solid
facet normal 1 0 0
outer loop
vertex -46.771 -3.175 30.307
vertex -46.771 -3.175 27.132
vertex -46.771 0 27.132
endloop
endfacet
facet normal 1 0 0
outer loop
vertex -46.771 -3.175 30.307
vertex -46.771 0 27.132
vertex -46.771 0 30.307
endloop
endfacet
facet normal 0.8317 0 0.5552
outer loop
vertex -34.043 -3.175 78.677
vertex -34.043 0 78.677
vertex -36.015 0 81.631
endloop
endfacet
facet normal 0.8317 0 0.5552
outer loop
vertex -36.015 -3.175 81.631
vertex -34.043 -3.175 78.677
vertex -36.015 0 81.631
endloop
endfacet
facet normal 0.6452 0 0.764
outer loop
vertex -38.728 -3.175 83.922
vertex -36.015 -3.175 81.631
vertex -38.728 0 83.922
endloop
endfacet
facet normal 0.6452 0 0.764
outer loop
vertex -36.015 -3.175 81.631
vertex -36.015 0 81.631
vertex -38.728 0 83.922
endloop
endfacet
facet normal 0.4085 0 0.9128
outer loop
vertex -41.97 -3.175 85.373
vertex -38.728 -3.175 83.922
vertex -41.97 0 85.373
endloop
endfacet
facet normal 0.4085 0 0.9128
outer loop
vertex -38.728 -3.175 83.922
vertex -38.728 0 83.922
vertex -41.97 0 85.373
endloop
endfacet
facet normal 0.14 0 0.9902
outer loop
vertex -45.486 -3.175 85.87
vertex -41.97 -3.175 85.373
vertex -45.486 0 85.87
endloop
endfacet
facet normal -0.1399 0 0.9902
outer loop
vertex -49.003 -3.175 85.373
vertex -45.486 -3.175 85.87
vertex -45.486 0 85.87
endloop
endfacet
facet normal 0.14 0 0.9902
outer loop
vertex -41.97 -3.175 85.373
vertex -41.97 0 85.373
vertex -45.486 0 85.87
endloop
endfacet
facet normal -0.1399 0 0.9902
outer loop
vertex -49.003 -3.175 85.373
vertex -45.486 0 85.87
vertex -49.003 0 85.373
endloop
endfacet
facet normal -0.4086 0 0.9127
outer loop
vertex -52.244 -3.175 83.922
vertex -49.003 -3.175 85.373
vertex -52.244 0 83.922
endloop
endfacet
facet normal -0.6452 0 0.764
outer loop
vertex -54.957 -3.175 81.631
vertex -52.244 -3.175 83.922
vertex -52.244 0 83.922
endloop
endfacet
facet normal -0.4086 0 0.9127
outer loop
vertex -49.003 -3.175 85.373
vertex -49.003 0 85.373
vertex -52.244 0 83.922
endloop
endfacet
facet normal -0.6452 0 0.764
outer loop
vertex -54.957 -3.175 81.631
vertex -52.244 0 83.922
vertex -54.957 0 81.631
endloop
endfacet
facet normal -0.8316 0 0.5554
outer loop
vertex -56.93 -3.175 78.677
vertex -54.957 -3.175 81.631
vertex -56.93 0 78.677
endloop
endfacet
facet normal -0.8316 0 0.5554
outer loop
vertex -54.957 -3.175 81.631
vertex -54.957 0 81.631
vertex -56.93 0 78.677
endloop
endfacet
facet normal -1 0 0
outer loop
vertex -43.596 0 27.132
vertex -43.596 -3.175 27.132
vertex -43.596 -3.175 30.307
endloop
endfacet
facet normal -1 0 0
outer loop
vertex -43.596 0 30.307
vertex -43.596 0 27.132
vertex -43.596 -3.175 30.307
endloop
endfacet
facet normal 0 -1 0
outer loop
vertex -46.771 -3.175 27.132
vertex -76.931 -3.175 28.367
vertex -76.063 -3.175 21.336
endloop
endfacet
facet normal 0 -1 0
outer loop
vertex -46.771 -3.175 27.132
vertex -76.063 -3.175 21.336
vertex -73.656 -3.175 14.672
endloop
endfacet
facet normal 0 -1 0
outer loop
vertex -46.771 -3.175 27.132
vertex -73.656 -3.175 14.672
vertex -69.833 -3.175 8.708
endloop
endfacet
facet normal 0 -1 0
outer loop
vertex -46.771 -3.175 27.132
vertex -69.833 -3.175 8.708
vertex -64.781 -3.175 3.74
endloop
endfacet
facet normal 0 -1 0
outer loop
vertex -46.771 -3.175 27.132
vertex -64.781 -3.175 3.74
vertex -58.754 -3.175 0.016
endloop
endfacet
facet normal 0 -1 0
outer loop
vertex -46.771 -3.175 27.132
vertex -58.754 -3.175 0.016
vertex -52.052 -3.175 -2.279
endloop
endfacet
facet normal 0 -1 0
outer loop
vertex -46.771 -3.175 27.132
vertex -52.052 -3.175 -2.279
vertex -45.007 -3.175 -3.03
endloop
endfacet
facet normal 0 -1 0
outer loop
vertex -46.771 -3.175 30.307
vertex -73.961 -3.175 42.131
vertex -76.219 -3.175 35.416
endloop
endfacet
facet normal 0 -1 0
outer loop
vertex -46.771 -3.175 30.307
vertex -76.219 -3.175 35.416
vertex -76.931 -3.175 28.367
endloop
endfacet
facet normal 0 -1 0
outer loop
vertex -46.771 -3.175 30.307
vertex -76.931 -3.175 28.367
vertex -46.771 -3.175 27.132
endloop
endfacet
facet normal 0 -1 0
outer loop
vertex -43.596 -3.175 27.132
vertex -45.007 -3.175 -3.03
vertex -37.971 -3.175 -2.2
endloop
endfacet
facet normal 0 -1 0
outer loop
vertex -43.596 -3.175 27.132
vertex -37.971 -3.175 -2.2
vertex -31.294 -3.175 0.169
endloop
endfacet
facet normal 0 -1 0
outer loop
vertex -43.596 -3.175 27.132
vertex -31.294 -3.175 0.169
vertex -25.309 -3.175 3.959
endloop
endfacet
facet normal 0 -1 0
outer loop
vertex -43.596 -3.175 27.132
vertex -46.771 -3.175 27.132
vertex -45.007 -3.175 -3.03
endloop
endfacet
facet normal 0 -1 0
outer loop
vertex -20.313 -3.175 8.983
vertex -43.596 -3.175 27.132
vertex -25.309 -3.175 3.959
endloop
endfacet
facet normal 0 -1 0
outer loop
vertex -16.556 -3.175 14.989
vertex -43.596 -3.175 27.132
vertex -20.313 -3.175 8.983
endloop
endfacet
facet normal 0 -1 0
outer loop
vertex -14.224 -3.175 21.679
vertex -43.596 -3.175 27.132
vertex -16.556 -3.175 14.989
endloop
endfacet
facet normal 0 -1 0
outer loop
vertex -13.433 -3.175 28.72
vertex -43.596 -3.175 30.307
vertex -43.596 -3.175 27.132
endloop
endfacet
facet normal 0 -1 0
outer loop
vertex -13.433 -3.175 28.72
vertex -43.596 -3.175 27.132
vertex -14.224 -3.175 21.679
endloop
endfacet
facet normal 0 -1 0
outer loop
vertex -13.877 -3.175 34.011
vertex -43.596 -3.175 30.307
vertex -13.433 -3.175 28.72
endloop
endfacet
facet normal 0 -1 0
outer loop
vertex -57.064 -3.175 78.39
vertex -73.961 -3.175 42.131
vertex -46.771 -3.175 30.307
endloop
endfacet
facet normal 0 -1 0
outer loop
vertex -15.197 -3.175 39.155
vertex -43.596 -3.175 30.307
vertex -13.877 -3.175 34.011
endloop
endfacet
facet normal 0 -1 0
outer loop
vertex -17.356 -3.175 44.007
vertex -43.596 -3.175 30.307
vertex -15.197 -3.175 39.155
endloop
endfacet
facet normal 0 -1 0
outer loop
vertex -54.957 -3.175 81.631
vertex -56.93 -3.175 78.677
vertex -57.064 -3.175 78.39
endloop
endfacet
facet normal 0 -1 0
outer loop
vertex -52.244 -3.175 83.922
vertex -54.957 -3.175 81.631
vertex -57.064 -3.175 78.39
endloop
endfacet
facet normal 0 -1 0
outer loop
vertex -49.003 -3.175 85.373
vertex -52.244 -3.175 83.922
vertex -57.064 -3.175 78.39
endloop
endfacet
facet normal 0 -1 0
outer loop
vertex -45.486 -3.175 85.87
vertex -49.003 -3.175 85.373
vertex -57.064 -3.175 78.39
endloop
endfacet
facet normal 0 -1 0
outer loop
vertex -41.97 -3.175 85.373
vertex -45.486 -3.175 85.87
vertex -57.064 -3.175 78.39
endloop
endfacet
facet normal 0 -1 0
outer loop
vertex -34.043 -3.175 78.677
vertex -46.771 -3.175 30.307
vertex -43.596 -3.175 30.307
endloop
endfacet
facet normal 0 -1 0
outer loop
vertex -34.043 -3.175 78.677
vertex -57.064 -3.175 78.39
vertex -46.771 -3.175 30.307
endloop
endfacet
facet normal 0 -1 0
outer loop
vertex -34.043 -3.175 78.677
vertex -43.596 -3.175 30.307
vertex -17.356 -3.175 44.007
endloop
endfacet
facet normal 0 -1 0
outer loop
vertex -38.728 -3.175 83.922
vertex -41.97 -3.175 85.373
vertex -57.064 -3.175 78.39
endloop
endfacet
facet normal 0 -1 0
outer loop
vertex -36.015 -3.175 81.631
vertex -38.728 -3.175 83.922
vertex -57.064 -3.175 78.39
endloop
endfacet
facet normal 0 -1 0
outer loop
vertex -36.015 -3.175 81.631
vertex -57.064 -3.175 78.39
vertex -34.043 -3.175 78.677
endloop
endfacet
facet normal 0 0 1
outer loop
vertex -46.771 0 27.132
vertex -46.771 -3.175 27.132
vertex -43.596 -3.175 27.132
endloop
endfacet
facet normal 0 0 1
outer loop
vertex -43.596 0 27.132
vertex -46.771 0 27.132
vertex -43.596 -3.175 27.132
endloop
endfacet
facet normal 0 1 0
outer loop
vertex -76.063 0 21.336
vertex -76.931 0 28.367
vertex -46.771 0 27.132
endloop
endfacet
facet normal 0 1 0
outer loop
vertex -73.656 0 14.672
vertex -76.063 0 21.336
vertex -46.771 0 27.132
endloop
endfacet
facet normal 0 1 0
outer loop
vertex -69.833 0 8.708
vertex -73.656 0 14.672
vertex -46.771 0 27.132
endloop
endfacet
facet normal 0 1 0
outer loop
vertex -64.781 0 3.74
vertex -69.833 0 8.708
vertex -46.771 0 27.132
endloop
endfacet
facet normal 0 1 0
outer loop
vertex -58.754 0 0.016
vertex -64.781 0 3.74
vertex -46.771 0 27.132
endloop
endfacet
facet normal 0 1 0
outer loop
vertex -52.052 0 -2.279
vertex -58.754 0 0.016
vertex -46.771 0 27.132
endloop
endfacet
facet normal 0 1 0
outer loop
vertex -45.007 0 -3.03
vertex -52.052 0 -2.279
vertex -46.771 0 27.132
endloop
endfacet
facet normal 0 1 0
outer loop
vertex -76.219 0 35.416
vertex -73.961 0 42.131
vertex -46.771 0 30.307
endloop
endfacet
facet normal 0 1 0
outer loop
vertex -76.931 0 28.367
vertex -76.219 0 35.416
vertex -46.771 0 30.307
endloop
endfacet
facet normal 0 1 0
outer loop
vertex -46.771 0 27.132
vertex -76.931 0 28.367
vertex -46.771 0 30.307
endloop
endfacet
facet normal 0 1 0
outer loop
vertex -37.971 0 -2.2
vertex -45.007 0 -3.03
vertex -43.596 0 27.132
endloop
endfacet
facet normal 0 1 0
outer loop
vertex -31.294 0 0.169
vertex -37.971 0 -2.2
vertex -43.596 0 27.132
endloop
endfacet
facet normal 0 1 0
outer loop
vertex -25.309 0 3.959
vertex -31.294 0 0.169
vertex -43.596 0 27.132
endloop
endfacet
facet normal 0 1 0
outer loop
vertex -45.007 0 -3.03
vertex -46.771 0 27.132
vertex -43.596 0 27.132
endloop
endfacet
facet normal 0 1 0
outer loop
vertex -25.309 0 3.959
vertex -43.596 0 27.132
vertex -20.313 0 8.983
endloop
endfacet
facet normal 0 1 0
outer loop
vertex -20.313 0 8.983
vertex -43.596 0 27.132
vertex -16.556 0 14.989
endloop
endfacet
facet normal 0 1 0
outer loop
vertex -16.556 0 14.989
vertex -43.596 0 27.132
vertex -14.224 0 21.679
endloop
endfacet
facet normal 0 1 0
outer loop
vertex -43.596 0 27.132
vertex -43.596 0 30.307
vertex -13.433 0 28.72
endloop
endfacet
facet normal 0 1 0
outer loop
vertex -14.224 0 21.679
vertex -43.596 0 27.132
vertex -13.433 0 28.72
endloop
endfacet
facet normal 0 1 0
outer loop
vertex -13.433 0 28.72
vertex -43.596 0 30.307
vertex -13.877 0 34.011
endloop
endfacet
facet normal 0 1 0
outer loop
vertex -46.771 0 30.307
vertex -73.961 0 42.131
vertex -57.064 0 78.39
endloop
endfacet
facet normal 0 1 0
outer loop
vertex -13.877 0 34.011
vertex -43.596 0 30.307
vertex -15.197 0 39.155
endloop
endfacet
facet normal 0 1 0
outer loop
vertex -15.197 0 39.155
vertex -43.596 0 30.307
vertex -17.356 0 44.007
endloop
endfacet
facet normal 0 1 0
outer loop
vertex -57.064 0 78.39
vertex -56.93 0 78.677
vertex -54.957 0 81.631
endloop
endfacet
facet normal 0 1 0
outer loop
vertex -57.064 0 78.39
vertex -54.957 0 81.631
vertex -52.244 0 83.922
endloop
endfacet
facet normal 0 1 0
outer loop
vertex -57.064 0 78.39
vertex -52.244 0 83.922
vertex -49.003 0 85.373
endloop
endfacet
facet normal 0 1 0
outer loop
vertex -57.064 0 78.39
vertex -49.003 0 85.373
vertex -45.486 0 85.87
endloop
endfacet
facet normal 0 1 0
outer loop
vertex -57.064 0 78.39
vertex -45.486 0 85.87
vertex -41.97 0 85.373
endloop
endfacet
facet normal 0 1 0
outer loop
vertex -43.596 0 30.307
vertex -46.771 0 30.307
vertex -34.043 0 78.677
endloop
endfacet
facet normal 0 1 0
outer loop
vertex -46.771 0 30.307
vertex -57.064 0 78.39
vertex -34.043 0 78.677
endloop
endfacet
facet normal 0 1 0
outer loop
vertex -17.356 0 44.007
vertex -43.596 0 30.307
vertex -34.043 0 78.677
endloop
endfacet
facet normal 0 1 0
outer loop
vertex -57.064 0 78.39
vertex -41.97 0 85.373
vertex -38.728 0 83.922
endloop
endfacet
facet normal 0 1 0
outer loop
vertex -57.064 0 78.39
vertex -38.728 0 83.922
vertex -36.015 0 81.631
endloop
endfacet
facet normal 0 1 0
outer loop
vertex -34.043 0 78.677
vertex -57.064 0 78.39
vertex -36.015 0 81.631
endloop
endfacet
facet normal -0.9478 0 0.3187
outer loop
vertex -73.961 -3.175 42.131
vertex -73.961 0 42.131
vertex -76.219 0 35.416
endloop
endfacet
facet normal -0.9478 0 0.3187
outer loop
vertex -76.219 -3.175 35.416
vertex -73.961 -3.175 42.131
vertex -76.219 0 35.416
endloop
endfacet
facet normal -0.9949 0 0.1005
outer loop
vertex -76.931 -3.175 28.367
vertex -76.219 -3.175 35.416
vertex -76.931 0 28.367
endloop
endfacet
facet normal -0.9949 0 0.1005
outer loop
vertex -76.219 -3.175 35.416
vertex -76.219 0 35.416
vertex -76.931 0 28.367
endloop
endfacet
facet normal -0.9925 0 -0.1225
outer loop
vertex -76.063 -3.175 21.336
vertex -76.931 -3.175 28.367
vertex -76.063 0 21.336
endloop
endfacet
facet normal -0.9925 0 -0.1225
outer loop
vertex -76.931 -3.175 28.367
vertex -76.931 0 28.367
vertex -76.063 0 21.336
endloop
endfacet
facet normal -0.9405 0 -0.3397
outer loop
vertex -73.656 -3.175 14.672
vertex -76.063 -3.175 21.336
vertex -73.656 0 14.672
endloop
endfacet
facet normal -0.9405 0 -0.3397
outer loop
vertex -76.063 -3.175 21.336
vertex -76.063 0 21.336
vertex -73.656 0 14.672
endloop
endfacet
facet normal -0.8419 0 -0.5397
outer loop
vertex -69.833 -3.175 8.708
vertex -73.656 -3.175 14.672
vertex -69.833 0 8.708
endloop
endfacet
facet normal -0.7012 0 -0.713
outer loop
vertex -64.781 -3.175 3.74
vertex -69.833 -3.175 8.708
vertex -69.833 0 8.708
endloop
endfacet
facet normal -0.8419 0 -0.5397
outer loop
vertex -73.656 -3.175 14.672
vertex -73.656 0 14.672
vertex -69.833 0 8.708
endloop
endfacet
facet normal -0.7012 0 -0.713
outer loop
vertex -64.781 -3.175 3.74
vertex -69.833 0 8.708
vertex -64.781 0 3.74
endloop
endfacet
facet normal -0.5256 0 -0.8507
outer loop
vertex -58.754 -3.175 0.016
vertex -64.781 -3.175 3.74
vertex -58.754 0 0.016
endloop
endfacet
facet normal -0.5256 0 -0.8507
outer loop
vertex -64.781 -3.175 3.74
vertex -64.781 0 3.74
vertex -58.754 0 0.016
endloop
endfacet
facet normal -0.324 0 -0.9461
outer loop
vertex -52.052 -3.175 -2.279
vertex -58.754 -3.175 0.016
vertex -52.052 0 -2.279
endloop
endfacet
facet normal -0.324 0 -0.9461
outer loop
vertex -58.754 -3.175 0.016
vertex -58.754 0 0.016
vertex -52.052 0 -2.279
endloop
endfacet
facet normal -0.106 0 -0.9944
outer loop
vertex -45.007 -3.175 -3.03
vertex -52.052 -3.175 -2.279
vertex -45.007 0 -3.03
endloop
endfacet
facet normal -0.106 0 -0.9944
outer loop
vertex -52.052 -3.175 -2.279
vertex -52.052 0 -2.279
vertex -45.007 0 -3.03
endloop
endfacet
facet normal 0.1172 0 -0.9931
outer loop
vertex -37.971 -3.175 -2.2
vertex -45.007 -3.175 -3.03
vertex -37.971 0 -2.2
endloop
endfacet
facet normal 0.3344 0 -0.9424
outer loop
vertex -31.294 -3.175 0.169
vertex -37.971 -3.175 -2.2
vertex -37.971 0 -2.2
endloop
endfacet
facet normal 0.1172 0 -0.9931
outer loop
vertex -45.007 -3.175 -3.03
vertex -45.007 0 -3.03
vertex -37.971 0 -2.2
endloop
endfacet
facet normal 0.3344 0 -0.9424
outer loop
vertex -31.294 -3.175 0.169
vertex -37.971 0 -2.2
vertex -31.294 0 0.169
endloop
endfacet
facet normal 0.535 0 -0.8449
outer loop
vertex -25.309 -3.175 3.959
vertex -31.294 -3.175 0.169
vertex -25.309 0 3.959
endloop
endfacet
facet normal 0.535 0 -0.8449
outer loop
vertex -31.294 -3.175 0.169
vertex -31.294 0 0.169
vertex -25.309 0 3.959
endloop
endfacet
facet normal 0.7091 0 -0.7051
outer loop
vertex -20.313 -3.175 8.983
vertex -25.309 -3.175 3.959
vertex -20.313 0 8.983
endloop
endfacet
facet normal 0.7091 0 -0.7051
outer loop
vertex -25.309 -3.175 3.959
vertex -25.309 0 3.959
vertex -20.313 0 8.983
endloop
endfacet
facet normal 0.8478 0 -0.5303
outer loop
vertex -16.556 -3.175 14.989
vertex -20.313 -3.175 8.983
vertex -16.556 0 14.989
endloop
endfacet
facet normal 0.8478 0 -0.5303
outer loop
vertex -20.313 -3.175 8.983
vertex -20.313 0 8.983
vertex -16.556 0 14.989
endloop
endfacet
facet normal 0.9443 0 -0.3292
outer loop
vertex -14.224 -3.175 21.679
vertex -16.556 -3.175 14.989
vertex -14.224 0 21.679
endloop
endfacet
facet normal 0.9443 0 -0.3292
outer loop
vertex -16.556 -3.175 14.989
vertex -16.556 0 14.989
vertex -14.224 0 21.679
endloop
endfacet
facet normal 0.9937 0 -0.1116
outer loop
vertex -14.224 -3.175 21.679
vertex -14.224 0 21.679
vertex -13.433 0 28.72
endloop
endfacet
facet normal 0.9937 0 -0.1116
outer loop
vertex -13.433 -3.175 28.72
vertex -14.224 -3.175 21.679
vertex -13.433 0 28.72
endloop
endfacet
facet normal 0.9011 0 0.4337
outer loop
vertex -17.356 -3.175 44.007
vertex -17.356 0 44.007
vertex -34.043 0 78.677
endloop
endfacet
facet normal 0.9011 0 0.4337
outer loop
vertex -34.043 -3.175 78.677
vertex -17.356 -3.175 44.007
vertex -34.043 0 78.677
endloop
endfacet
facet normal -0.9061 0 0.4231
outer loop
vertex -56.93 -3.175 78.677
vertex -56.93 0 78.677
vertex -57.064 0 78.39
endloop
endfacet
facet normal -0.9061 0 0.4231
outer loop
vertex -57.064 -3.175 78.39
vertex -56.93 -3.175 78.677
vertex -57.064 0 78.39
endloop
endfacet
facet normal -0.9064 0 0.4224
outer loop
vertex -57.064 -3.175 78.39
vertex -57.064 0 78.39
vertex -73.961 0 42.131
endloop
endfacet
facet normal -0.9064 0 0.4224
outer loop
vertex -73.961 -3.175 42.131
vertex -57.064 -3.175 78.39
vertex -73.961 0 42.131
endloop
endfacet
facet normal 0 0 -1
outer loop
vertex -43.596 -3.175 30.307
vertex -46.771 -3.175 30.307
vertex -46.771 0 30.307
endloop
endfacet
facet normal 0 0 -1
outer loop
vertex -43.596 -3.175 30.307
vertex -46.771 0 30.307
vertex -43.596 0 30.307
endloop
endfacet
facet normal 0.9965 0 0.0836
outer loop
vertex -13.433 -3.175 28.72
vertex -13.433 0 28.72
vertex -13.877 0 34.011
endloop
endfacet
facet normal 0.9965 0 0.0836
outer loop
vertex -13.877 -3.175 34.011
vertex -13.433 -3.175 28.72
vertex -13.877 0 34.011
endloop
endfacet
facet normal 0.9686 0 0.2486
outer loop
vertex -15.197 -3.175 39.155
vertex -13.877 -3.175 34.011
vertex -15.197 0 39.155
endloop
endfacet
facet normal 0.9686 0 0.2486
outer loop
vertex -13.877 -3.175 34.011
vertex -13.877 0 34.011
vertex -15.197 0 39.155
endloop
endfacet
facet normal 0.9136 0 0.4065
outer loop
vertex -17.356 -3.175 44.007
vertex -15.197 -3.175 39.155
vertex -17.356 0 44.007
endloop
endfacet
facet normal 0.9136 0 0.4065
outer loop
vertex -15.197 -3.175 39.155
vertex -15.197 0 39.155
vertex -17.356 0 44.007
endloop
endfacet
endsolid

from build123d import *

# Parameters (mm, degrees)
F0_W     = 3.175
F0_H     = 3.175
F1_DEPTH = 3.175


with BuildPart() as f1:
    # F0 (on Front) → F1 (new body)
    with BuildSketch(Plane.XZ):
        with BuildLine():
            ThreePointArc((-73.961423, 42.131236), (-52.05154, -2.278535), (-13.433104, 28.719644))
            ThreePointArc((-13.433104, 28.719644), (-14.429342, 36.610694), (-17.35554, 44.00654))
            ThreePointArc((-17.35554, 44.00654), (-46.234377, 60.452235), (-73.961423, 42.131236))
        make_face()
        with Locations((-45.183104, 28.719644)):
            Rectangle(F0_W, F0_H, mode=Mode.SUBTRACT)
        with BuildLine():
            ThreePointArc((-73.961423, 42.131236), (-46.234377, 60.452235), (-17.35554, 44.00654))
            Line((-17.35554, 44.00654), (-34.04271, 78.677435))
            ThreePointArc((-34.04271, 78.677435), (-33.104337, 75.99429), (-32.786234, 73.169644))
            ThreePointArc((-32.786234, 73.169644), (-48.156231, 60.753481), (-57.063575, 78.390292))
            Line((-57.063575, 78.390292), (-73.961423, 42.131236))
        make_face()
        with BuildLine():
            ThreePointArc((-32.786234, 73.169644), (-33.104337, 75.99429), (-34.04271, 78.677435))
            Line((-34.04271, 78.677435), (-56.929758, 78.677435))
            Line((-56.929758, 78.677435), (-57.063575, 78.390292))
            ThreePointArc((-57.063575, 78.390292), (-48.156231, 60.753481), (-32.786234, 73.169644))
        make_face()
        with BuildLine():
            Line((-56.929758, 78.677435), (-34.04271, 78.677435))
            ThreePointArc((-34.04271, 78.677435), (-45.486234, 85.869644), (-56.929758, 78.677435))
        make_face()
    extrude(amount=F1_DEPTH)


solid = f1.part
